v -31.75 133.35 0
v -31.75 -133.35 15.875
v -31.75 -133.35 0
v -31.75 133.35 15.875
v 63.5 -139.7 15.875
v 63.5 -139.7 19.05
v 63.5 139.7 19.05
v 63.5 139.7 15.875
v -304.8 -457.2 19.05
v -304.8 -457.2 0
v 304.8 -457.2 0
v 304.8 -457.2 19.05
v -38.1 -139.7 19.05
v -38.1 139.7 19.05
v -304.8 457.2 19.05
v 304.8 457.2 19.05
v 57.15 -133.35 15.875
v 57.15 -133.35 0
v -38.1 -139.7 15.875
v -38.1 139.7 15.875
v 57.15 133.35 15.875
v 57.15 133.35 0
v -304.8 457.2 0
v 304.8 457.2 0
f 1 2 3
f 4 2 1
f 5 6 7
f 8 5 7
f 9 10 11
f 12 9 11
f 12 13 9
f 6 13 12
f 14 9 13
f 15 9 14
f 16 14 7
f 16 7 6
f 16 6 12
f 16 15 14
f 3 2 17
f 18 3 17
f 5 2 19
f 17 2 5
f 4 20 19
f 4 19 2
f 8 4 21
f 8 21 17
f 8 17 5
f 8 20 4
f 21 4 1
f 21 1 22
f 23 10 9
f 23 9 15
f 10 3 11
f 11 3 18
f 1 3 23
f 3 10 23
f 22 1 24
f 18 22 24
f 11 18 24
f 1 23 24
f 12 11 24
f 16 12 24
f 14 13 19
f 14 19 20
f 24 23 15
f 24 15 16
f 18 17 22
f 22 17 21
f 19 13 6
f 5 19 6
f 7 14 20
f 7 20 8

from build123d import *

# Parameters (mm, degrees)
F0_W     = 609.6
F0_H     = 914.4
F1_DEPTH = 19.05
F2_W     = 101.6
F2_H     = 279.4
F3_DEPTH = 3.175
F4_W     = 88.9
F4_H     = 266.7
F5_DEPTH = 25.4


with BuildPart() as f1:
    # F0 (on Top) → F1 (new body)
    with BuildSketch(Plane.XY):
        Rectangle(F0_W, F0_H)
    extrude(amount=F1_DEPTH)

    # F2 (on face) → F3 (cut)
    with BuildSketch(Plane.XY.offset(19.05)):
        with Locations((12.7, 0)):
            Rectangle(F2_W, F2_H)
    extrude(amount=-F3_DEPTH, mode=Mode.SUBTRACT)

    # F4 (on face) → F5 (cut)
    with BuildSketch(Plane.XY.offset(15.875)):
        with Locations((12.7, 0)):
            Rectangle(F4_W, F4_H)
    extrude(amount=-F5_DEPTH, mode=Mode.SUBTRACT)


solid = f1.part
